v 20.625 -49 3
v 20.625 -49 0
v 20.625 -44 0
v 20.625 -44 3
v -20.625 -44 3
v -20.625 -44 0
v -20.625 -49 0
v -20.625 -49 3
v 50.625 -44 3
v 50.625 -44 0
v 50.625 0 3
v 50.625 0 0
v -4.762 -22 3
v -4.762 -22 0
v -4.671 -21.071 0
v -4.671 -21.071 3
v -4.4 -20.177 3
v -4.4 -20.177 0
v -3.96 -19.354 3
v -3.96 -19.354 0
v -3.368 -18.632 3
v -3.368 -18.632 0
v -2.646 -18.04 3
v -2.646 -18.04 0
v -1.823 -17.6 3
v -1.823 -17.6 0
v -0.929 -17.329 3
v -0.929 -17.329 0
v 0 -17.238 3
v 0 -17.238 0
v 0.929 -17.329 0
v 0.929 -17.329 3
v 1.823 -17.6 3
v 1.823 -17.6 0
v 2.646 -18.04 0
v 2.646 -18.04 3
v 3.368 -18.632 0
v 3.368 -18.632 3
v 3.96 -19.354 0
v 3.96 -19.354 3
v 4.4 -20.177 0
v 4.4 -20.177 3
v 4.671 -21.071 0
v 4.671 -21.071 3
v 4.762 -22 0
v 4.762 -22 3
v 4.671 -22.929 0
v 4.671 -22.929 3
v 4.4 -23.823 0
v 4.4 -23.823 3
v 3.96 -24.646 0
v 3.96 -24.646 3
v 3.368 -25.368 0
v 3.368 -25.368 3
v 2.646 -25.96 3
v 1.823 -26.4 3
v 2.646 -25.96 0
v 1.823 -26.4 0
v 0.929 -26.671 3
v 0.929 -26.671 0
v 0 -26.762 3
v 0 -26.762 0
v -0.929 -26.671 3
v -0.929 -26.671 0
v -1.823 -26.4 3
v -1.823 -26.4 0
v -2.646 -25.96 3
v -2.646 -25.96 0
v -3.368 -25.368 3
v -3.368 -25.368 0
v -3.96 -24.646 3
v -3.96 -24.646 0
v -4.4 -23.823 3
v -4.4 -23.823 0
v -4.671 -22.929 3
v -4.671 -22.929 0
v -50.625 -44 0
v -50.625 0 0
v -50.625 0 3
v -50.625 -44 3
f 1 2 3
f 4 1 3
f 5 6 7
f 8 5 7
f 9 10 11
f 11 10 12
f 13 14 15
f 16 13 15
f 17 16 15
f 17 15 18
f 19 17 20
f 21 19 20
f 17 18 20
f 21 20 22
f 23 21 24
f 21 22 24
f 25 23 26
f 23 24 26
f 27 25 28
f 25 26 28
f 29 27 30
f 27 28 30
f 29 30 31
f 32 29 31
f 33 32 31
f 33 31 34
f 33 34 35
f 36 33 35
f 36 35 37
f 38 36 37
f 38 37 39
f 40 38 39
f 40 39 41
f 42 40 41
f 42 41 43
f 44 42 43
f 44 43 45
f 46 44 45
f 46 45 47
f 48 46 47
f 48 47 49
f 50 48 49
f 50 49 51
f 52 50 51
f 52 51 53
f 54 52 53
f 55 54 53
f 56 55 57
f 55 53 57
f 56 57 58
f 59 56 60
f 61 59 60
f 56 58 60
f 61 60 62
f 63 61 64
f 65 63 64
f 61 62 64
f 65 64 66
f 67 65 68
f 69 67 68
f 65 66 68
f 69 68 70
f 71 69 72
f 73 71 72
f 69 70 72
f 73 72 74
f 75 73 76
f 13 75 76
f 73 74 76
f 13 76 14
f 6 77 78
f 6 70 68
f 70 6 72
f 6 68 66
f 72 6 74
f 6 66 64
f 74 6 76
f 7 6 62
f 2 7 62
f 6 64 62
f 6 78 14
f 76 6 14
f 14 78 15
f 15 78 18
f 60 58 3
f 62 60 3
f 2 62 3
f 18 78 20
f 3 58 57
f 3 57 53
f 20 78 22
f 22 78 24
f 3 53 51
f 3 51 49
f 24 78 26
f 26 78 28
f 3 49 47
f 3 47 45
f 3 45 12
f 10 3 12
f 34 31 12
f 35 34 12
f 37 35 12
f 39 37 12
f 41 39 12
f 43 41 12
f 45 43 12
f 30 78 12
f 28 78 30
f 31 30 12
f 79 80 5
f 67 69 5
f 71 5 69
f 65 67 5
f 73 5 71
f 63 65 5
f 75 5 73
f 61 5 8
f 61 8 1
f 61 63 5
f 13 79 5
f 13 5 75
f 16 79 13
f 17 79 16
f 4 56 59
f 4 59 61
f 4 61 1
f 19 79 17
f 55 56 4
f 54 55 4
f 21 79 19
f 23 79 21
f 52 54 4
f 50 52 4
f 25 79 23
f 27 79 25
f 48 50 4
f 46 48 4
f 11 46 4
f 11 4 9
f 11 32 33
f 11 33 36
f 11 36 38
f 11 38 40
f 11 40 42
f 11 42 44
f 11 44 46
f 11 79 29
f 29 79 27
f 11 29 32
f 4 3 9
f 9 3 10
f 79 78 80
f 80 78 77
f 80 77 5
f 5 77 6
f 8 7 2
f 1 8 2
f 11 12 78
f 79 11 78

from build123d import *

# Parameters (mm, degrees)
BOSS_EXTRUDE1_DEPTH        = 3
F_3_8_0_3750_DOWEL_HOLE1_D = 9.525


with BuildPart() as part:
    # Sketch1 → Boss-Extrude1 (new body)
    with BuildSketch(Plane.XY):
        Polygon((-50.625, 0), (-50.625, -44), (-20.625, -44), (-20.625, -49), (20.625, -49), (20.625, -44), (50.625, -44), (50.625, 0), align=None)
    extrude(amount=BOSS_EXTRUDE1_DEPTH)

    # 3/8 (0.3750) Dowel Hole1 (through all)
    with Locations(Plane.XY.offset(3)):
        with Locations((0, -22)):
            Hole(F_3_8_0_3750_DOWEL_HOLE1_D / 2)


solid = part.part
